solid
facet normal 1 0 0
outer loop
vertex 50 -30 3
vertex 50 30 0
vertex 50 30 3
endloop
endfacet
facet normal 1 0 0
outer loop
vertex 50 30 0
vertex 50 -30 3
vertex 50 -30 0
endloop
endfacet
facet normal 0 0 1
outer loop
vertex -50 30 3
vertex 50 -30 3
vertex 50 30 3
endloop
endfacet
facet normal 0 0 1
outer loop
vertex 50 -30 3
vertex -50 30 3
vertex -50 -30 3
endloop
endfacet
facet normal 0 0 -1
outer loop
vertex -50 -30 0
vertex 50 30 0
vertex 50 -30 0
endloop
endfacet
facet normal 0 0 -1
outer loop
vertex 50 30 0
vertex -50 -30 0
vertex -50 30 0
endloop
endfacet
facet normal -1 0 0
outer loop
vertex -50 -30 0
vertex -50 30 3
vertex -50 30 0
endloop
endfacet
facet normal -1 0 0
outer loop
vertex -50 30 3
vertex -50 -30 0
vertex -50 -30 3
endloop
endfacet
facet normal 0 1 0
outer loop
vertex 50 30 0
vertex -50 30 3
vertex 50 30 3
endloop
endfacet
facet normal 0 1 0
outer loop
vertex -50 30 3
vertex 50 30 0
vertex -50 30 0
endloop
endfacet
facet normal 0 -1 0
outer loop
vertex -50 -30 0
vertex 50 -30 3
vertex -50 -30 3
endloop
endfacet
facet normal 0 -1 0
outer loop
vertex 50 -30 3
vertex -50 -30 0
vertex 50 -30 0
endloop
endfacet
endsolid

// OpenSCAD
// file: consts.scad
// ============================================================
// SHARED CONSTANTS
// Description: Constants used by multiple parts in [PROJECT_NAME]
// ============================================================

// ============================================================
// WIDGET DIMENSIONS
// ============================================================
// Example: If your project holds/fits a specific object,
// define its dimensions here

// Widget dimensions (example - replace with your actual object)
WIDGET_DIAMETER = 50;
WIDGET_HEIGHT = 20;

// ============================================================
// CALCULATED DIMENSIONS
// ============================================================
// Dimensions derived from base constants and tolerances

// Slot/holder sizing with clearance
SLOT_WIDTH = WIDGET_DIAMETER + 2;      // 2mm total clearance
SLOT_HEIGHT = WIDGET_HEIGHT + 1;       // 1mm clearance

// Spacing between elements
ELEMENT_SPACING = WIDGET_DIAMETER + 10;  // 10mm gap between widgets

// ============================================================
// EXAMPLE USAGE
// ============================================================
// In your part files:
//   include <consts.scad>
//   cylinder(d = WIDGET_DIAMETER + TOLERANCE, h = WIDGET_HEIGHT);
// file: ../config.scad
// ============================================================
// PROJECT CONFIGURATION
// Description: Global settings for [PROJECT_NAME]
// ============================================================

// ============================================================
// RENDERING SETTINGS
// ============================================================

// Preview quality (lower = faster preview)
PREVIEW_FN = 32;

// Export quality (higher = smoother STL)
EXPORT_FN = 128;

// Current mode (set to true when exporting STL)
// Override from command line: openscad -D 'EXPORT_MODE=true' ...
EXPORT_MODE = false;

// Convenience variable - automatically use correct quality
$fn = EXPORT_MODE ? EXPORT_FN : PREVIEW_FN;

// ============================================================
// PROJECT DIMENSIONS
// ============================================================

// Base dimensions (millimeters)
BASE_WIDTH = 100;
BASE_DEPTH = 60;
BASE_HEIGHT = 30;

// Material settings
WALL_THICKNESS = 2;
FLOOR_THICKNESS = 3;

// Hardware
MOUNTING_HOLE_DIAMETER = 5;
MOUNTING_HOLE_SPACING = 80;

// ============================================================
// TOLERANCES
// ============================================================

// General fit tolerance (for sliding parts)
TOLERANCE = 0.2;

// Tight fit (press-fit, requires force)
TIGHT_FIT = 0.1;

// Loose fit (easy sliding, clearance)
LOOSE_FIT = 0.5;

// 3D printer compensation (add to holes, subtract from pegs)
PRINTER_TOLERANCE = 0.15;

// ============================================================
// FEATURE FLAGS
// ============================================================

// Enable experimental features
ENABLE_ADVANCED_FEATURES = false;

// Include support structures in export
INCLUDE_SUPPORTS = false;

// Show reference geometry in previews
SHOW_REFERENCE = true;

// ============================================================
// RENDERING HELPERS
// ============================================================

// Helper function to determine if we're in preview mode
function is_preview() = !EXPORT_MODE;

// Helper function to determine if we're in export mode
function is_export() = EXPORT_MODE;
// main file
// ============================================================
// PART: Part One
// Description: Base plate for [PROJECT_NAME]
// ============================================================

include <../config.scad>
include <consts.scad>

// ============================================================
// PART MODULE
// ============================================================

// Module: part_one()
// Usage:
//   part_one();
//   part_one(width, depth, thickness);
// Description:
//   Creates the base plate with mounting holes
// Arguments:
//   width = Width of the base plate. Default: BASE_WIDTH
//   depth = Depth of the base plate. Default: BASE_DEPTH
//   thickness = Thickness of the plate. Default: FLOOR_THICKNESS
// Example(3D): Standard base plate
//   part_one();
// Example(3D): Custom sized base plate
//   part_one(width=150, depth=80, thickness=5);
module part_one(
    width = BASE_WIDTH,
    depth = BASE_DEPTH,
    thickness = FLOOR_THICKNESS
) {
    difference() {
        // Main plate body
        translate([0, 0, thickness/2])
            cube([width, depth, thickness], center = true);

        // Mounting holes at corners
        for (x = [-1, 1], y = [-1, 1]) {
            translate([
                x * MOUNTING_HOLE_SPACING/2,
                y * MOUNTING_HOLE_SPACING/2,
                -0.1
            ])
                cylinder(
                    d = MOUNTING_HOLE_DIAMETER,
                    h = thickness + 0.2,
                    $fn = EXPORT_MODE ? 64 : 16
                );
        }
    }
}

// ============================================================
// RENDER
// ============================================================

// Render this part when file is opened directly
part_one();
